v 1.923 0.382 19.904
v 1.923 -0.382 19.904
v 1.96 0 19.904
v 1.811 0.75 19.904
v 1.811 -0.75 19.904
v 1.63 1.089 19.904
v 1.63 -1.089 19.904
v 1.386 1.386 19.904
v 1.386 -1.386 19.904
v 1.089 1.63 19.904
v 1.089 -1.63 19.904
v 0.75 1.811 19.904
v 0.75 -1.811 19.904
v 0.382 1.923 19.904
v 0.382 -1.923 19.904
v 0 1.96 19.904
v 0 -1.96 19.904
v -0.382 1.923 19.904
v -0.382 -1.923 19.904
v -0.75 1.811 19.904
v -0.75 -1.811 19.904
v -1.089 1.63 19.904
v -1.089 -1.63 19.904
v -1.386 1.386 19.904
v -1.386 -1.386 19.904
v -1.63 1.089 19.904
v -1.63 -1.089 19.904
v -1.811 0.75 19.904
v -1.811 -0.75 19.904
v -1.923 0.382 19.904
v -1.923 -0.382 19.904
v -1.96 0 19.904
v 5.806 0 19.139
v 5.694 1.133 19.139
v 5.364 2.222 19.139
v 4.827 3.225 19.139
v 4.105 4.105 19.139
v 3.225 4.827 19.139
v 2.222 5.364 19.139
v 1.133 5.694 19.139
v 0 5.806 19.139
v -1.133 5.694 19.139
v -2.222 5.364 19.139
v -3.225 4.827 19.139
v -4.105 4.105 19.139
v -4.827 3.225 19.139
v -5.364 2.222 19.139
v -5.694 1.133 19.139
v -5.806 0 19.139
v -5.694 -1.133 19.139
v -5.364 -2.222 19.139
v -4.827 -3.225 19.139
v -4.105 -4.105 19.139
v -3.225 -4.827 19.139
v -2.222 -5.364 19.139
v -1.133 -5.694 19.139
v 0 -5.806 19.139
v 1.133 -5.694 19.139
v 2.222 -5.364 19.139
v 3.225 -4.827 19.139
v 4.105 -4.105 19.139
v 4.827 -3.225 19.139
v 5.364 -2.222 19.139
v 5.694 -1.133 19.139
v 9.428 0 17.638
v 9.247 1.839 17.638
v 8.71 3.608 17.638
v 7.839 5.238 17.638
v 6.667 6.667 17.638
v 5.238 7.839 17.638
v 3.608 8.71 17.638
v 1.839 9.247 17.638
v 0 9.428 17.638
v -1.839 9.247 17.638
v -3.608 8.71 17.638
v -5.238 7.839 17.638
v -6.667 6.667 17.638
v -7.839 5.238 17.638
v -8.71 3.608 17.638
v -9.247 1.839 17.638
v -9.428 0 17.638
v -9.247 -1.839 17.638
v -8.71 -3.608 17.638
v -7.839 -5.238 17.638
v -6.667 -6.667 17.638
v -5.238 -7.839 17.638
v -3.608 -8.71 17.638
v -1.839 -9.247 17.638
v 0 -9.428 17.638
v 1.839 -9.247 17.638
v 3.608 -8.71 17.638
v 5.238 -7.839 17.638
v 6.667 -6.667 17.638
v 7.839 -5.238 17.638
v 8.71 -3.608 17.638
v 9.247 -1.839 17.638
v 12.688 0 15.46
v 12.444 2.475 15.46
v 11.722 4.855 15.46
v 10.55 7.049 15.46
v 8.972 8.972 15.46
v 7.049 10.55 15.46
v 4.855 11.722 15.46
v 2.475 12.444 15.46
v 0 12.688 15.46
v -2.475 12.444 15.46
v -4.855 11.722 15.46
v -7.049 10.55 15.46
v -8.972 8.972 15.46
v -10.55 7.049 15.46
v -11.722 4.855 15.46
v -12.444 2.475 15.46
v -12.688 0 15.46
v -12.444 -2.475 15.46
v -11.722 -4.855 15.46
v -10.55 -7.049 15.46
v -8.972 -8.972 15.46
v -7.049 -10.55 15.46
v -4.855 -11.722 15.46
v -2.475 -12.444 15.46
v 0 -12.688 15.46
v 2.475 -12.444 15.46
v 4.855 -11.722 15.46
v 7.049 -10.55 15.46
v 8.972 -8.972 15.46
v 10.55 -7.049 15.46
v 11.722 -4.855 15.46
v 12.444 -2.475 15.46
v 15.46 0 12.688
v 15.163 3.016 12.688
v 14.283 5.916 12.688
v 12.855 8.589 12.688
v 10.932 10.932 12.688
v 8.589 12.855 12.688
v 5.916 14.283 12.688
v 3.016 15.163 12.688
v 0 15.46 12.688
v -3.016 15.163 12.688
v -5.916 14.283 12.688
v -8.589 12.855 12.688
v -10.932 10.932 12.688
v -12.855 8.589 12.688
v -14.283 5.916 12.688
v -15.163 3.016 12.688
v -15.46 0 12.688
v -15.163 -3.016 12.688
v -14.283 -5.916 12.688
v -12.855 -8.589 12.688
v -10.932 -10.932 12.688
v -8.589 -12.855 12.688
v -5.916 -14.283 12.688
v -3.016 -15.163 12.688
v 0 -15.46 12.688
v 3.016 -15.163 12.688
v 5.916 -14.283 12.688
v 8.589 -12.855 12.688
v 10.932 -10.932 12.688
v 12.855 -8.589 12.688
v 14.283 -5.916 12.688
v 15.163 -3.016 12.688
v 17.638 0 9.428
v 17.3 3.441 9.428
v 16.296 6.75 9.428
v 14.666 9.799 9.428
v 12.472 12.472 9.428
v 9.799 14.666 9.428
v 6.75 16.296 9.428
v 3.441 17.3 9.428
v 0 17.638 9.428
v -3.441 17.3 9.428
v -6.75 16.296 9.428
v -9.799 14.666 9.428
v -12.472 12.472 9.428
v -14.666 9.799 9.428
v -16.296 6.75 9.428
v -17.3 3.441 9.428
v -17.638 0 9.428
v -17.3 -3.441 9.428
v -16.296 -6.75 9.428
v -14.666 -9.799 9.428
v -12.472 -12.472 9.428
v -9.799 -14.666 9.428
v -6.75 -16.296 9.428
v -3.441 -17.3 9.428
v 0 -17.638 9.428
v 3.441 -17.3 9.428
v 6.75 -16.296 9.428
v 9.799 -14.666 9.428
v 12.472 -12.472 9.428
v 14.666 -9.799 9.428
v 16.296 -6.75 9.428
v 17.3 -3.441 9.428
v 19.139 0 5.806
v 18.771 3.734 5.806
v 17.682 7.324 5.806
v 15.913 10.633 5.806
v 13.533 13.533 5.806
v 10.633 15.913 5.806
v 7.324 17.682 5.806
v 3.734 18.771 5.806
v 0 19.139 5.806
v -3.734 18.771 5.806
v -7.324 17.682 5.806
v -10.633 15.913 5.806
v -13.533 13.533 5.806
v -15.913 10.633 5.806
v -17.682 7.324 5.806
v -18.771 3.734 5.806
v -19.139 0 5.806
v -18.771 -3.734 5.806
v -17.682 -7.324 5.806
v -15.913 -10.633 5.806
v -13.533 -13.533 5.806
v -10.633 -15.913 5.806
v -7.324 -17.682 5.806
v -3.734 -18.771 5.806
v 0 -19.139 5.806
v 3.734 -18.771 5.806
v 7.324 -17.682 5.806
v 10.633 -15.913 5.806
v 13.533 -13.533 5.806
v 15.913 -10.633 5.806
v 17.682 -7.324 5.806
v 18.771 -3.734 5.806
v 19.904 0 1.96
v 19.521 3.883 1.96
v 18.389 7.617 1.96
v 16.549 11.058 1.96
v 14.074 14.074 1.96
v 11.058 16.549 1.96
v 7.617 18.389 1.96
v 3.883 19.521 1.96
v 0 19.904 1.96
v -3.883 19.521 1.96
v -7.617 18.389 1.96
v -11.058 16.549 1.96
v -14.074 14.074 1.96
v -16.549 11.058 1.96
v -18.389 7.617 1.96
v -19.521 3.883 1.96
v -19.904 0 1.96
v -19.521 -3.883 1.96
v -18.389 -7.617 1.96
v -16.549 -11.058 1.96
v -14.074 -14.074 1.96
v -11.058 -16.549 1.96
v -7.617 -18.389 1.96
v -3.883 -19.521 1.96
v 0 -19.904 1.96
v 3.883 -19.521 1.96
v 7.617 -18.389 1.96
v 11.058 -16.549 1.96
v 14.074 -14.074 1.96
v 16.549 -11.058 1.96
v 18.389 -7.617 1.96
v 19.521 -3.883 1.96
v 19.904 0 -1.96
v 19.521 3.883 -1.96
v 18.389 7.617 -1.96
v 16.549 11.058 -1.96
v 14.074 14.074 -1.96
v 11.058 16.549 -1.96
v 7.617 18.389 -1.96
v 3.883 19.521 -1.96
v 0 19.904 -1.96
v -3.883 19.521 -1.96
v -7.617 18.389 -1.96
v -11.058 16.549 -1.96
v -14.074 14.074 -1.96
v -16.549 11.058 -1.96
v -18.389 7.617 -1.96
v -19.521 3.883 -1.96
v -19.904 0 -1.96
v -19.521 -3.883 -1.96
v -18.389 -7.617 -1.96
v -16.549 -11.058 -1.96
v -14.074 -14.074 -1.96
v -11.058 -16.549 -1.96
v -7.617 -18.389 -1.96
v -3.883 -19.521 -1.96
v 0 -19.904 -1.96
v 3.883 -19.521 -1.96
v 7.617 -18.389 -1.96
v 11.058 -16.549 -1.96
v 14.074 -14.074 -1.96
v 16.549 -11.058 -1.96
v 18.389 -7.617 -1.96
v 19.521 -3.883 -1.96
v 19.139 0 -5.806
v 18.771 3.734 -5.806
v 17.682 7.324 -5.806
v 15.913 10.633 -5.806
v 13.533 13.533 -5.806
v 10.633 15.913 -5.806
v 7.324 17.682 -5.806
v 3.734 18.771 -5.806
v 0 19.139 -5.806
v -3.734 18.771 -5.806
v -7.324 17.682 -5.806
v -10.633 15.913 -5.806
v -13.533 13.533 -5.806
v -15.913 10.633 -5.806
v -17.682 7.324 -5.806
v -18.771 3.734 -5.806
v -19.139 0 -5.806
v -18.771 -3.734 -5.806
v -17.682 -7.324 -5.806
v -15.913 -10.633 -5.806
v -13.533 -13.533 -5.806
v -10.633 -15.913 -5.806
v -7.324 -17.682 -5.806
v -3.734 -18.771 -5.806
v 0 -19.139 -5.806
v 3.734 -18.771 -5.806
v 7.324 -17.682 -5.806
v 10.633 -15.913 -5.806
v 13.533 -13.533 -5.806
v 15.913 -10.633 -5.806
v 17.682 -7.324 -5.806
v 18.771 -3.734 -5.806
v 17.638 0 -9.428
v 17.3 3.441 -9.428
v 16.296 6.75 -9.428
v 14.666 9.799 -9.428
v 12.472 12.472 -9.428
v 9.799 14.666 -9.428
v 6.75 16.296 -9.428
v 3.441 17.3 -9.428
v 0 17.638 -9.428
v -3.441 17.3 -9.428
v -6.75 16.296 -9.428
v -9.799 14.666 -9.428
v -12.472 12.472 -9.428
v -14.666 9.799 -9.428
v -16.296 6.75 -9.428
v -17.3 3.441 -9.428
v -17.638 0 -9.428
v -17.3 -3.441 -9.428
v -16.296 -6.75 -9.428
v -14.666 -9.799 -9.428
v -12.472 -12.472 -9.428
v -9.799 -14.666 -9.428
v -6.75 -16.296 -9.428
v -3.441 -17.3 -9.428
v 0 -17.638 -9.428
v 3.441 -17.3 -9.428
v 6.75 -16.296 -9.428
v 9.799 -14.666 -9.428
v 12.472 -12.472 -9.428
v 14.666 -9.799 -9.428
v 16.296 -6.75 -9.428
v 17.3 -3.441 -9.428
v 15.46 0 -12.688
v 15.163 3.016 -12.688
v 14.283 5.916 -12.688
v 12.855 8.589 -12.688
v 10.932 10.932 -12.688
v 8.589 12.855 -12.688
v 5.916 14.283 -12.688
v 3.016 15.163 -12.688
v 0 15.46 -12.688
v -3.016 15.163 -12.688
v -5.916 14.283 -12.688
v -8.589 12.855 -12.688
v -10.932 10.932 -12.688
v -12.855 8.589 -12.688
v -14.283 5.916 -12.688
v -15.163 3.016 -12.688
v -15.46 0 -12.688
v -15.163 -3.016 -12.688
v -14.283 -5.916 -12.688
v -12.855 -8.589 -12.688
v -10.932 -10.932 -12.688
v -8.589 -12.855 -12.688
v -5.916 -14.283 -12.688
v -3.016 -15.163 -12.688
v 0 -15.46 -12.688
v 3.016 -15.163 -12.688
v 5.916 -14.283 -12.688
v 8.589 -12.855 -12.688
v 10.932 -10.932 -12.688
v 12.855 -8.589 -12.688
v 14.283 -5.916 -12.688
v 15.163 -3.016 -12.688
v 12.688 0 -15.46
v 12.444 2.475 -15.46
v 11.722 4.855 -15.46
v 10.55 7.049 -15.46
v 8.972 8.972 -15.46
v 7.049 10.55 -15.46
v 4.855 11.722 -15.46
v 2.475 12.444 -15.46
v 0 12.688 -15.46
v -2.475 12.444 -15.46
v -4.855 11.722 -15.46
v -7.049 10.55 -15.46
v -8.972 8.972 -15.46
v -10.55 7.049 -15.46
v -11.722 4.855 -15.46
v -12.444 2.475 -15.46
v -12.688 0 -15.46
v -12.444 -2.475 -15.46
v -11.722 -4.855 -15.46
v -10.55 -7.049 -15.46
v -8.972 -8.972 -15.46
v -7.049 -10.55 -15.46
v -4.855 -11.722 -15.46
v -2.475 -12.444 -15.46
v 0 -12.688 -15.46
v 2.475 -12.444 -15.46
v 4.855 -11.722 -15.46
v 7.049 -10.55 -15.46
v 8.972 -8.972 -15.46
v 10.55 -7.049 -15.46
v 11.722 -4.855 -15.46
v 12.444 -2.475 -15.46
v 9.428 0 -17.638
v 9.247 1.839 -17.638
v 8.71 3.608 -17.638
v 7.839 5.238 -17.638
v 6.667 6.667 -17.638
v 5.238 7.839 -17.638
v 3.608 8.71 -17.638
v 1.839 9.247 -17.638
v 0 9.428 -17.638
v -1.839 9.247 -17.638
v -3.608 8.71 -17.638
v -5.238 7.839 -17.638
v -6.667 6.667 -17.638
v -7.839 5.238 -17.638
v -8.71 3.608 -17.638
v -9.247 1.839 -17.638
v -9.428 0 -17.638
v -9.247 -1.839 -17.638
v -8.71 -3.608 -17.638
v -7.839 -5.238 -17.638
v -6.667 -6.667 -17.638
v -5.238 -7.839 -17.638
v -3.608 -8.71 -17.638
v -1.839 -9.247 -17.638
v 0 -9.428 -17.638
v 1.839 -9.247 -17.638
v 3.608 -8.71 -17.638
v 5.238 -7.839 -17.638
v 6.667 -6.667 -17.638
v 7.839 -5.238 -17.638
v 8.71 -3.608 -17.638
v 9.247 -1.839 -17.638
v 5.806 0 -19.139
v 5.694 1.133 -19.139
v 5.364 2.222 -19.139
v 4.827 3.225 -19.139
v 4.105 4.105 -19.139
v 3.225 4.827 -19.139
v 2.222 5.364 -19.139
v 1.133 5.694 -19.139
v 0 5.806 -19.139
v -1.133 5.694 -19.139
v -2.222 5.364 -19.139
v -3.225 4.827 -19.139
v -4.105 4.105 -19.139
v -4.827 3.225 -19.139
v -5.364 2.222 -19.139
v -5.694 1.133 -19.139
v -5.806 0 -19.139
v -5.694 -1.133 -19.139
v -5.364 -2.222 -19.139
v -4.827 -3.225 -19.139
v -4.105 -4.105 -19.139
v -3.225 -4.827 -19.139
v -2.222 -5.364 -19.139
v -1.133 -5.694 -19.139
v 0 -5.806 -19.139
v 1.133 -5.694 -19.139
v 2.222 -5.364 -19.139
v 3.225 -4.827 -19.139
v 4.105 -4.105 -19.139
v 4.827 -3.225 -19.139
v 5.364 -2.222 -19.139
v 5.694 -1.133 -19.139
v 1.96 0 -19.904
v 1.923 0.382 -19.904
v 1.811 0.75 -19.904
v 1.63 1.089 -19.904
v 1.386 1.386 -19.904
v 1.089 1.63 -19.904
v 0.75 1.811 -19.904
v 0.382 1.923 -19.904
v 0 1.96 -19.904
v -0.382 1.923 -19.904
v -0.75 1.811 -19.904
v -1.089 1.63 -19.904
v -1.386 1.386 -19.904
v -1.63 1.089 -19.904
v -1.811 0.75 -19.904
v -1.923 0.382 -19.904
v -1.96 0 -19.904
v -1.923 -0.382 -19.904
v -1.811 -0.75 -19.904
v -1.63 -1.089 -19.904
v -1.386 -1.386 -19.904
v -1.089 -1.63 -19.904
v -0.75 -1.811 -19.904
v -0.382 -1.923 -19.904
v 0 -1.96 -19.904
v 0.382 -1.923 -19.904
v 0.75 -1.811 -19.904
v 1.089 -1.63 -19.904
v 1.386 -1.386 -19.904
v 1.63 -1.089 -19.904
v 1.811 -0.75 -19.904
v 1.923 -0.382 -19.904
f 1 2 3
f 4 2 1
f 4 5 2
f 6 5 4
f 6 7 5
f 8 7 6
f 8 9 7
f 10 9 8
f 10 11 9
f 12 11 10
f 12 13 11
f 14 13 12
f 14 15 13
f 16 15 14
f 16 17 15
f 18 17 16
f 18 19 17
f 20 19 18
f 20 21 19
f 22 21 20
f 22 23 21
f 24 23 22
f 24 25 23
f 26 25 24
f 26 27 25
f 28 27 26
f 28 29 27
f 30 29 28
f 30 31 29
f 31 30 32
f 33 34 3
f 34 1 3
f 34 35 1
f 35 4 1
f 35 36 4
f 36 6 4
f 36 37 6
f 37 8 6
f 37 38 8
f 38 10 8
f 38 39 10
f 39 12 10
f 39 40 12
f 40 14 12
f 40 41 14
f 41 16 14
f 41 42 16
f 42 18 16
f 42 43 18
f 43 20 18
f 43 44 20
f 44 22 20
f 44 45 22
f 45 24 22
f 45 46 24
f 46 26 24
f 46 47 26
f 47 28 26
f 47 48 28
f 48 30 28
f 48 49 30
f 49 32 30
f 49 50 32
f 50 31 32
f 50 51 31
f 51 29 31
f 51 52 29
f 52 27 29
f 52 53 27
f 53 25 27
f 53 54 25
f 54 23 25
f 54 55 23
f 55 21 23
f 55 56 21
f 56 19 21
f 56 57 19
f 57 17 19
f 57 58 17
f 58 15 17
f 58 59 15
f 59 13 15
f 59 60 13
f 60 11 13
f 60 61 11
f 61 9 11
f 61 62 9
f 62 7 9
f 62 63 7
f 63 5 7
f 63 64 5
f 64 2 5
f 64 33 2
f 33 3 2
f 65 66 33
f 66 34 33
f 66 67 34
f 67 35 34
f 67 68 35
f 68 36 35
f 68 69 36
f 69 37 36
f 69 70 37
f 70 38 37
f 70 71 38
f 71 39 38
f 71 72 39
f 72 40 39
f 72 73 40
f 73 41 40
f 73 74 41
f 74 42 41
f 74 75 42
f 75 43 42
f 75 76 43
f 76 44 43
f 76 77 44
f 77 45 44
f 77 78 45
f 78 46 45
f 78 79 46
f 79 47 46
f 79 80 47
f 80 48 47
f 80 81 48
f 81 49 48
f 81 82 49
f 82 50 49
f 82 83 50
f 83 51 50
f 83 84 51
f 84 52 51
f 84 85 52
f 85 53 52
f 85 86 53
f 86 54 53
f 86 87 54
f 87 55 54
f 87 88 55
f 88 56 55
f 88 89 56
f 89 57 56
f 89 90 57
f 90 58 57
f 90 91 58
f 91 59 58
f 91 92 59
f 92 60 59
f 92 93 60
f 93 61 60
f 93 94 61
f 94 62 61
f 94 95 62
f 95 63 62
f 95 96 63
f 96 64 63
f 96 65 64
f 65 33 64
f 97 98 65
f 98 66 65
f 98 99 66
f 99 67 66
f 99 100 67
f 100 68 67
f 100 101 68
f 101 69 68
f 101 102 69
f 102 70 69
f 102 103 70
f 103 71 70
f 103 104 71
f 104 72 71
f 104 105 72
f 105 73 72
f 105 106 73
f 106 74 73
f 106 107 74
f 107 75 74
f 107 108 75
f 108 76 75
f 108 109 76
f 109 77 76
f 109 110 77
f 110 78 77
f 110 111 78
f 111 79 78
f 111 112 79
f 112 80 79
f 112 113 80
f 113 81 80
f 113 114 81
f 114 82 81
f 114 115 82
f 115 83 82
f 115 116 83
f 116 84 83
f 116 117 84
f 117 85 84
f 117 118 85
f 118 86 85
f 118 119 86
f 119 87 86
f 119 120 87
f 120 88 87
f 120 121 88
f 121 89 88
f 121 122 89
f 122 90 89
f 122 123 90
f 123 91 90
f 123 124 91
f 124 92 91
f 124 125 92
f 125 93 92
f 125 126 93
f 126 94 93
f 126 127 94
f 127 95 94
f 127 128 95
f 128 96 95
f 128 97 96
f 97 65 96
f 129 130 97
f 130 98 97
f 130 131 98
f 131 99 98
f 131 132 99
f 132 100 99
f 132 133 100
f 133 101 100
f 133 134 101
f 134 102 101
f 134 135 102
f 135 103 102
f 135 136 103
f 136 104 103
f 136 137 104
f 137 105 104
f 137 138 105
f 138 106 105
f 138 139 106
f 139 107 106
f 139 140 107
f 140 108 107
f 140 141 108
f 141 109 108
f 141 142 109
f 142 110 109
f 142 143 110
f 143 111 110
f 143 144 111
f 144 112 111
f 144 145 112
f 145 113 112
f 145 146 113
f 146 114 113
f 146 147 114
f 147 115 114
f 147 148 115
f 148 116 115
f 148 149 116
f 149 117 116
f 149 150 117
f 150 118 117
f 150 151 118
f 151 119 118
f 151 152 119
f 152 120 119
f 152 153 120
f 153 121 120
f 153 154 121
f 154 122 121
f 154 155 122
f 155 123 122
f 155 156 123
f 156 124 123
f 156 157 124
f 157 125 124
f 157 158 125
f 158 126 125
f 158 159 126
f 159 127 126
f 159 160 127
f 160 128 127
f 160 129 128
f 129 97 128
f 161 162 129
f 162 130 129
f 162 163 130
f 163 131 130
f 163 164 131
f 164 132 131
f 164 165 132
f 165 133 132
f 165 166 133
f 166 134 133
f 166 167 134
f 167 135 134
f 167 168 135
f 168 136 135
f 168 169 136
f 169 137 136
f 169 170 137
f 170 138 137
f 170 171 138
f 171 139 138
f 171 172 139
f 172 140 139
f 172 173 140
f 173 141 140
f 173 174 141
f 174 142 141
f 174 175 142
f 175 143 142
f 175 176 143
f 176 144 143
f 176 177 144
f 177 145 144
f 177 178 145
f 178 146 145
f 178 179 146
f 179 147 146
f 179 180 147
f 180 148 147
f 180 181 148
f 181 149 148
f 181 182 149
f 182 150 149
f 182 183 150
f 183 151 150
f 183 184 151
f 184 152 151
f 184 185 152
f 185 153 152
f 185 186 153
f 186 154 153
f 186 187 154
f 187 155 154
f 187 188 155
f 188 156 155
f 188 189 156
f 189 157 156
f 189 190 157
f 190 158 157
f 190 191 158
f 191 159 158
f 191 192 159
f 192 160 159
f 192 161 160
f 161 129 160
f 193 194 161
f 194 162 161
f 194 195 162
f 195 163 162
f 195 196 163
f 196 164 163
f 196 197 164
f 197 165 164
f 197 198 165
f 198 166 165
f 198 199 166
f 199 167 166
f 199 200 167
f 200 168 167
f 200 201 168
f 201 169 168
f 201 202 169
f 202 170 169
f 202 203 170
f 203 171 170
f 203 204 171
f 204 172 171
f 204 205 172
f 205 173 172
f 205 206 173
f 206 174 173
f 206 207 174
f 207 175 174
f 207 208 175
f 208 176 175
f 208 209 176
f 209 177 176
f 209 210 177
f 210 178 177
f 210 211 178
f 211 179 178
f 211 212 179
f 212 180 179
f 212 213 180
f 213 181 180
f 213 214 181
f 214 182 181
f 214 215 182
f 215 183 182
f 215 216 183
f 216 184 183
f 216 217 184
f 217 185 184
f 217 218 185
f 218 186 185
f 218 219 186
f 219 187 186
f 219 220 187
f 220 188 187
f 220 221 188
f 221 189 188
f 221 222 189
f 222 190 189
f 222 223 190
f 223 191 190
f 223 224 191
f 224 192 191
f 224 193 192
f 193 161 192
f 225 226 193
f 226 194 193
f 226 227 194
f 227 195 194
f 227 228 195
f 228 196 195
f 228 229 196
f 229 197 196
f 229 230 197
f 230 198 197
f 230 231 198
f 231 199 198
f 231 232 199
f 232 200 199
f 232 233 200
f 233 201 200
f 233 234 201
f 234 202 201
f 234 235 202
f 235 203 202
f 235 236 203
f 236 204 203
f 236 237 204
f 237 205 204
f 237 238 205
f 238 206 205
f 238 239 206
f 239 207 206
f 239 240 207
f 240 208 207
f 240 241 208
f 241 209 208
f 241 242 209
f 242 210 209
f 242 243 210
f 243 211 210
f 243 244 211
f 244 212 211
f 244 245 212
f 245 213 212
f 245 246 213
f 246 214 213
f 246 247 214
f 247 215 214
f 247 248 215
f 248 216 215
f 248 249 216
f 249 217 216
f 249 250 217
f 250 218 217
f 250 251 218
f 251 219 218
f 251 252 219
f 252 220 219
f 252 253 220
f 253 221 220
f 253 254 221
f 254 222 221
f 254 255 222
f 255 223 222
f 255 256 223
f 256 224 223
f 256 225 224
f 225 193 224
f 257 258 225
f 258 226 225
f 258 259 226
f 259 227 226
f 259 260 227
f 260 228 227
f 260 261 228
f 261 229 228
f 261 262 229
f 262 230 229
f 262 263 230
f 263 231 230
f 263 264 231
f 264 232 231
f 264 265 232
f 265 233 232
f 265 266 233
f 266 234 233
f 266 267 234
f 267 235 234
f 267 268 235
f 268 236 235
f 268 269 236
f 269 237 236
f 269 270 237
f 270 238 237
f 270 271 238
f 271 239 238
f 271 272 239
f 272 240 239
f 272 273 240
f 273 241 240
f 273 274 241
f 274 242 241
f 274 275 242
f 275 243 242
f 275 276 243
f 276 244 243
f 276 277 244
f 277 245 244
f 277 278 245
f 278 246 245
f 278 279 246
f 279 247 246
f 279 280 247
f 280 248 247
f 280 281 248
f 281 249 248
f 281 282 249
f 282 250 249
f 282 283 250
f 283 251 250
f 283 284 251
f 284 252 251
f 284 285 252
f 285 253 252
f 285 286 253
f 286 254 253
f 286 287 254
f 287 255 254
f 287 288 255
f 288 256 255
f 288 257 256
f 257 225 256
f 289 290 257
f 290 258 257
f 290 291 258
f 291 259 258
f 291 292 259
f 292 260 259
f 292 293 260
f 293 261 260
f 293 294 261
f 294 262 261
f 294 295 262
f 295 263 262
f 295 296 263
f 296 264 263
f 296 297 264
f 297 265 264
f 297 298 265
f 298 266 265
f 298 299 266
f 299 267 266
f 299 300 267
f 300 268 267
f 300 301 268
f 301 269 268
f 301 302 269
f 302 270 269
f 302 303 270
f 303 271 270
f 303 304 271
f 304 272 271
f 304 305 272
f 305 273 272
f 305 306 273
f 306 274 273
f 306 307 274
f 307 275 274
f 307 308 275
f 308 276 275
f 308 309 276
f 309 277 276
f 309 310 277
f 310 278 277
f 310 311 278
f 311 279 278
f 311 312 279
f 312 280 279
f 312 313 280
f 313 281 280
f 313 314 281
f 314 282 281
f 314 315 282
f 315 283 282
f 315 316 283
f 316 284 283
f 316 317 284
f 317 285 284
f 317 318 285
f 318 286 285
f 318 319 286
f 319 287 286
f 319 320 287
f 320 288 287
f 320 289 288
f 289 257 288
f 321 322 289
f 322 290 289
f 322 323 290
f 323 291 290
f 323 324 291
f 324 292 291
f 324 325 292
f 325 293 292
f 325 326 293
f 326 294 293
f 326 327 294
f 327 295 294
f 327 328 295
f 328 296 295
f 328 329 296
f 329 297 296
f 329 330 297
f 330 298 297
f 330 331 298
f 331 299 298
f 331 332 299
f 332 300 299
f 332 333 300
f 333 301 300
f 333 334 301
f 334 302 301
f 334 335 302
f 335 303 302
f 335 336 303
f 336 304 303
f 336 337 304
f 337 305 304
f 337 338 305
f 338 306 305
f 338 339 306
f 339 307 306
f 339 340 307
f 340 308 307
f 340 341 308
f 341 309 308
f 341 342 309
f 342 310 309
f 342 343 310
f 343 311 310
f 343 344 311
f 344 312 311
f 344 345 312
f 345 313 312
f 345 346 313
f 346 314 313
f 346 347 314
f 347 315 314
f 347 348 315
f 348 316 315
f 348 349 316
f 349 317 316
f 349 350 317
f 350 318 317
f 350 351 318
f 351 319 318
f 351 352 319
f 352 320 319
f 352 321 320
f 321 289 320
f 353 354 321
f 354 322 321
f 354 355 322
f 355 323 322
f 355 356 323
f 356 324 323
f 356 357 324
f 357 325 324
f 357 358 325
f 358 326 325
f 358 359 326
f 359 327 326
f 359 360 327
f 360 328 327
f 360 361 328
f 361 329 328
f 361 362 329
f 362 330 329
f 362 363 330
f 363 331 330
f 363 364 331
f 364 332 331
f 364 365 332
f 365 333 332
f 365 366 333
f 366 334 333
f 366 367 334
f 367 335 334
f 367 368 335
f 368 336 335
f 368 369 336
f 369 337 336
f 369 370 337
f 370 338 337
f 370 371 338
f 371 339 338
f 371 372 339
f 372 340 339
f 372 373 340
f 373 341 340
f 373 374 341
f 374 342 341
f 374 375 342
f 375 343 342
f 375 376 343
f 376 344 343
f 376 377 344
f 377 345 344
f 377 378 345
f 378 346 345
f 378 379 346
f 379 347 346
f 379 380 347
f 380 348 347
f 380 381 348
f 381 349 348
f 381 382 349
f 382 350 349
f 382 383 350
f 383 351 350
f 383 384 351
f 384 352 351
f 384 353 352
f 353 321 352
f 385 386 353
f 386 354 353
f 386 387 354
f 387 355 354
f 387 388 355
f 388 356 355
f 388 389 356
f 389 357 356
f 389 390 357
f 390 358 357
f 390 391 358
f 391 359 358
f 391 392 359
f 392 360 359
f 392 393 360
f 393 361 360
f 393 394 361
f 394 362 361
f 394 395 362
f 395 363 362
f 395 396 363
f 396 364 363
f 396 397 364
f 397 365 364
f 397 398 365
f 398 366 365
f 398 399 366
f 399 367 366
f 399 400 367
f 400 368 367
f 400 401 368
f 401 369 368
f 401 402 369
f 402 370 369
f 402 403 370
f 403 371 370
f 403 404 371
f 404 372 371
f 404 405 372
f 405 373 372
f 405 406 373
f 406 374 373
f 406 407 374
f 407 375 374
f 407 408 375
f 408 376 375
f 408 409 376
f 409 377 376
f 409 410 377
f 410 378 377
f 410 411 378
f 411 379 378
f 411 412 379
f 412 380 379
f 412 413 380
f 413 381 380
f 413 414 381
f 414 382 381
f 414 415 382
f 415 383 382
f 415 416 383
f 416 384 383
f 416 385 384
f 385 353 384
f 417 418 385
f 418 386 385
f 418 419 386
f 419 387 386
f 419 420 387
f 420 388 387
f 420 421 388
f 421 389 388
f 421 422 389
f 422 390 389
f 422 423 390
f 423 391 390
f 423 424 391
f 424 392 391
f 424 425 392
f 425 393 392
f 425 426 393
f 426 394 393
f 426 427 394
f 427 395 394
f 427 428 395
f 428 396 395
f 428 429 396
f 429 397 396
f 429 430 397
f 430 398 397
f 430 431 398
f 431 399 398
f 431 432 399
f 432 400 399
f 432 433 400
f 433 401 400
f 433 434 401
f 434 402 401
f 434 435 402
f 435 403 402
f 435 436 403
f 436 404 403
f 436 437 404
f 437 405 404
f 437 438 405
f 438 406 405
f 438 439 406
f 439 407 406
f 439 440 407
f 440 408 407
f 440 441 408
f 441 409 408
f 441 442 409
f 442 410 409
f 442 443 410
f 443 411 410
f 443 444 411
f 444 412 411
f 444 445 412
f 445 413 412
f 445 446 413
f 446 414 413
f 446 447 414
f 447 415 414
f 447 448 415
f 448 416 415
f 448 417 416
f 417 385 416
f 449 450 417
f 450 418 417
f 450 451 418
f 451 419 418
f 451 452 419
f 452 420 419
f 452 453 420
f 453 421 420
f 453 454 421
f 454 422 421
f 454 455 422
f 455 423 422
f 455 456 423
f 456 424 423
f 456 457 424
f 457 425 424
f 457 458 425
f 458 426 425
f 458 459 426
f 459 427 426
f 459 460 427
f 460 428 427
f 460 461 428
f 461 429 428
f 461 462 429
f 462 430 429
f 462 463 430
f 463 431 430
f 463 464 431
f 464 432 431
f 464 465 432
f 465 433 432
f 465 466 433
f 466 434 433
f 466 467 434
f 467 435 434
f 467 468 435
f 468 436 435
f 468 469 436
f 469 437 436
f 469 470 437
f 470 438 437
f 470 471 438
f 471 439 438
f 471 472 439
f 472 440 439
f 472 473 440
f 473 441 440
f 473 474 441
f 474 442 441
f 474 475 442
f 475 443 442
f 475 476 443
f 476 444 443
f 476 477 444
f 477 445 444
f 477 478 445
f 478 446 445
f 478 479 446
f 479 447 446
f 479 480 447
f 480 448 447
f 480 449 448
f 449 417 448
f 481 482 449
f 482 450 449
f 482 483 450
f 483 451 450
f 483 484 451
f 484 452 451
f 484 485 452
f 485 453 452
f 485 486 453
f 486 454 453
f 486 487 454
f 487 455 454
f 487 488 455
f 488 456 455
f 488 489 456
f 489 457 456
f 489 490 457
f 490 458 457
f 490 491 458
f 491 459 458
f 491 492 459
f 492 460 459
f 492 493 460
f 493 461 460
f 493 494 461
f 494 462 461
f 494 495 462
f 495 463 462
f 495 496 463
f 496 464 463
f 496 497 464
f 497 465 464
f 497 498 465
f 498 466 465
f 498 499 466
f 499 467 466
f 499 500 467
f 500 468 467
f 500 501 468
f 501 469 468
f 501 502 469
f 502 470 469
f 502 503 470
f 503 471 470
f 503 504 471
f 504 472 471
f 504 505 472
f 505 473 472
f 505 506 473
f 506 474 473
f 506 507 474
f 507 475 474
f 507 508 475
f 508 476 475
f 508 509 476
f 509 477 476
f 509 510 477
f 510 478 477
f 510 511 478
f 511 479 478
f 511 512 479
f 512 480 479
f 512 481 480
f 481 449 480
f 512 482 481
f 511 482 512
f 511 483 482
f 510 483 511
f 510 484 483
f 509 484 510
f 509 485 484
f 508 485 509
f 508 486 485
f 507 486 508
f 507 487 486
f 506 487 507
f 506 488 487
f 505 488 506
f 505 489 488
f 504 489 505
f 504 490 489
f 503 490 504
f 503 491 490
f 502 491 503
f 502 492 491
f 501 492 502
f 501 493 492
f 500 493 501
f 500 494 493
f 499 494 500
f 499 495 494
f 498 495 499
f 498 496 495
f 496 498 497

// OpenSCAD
// fn-demo.scad — one ball, nothing else (chapter 10).
// Render it with -D fn=8, then fn=32, then fn=128 and
// compare the STL triangle counts and the render times:
// $fn is the dial between "fast and faceted" and
// "smooth and slow".

fn = 32; // override from the command line with -D fn=...

sphere(r = 20, $fn = fn);
